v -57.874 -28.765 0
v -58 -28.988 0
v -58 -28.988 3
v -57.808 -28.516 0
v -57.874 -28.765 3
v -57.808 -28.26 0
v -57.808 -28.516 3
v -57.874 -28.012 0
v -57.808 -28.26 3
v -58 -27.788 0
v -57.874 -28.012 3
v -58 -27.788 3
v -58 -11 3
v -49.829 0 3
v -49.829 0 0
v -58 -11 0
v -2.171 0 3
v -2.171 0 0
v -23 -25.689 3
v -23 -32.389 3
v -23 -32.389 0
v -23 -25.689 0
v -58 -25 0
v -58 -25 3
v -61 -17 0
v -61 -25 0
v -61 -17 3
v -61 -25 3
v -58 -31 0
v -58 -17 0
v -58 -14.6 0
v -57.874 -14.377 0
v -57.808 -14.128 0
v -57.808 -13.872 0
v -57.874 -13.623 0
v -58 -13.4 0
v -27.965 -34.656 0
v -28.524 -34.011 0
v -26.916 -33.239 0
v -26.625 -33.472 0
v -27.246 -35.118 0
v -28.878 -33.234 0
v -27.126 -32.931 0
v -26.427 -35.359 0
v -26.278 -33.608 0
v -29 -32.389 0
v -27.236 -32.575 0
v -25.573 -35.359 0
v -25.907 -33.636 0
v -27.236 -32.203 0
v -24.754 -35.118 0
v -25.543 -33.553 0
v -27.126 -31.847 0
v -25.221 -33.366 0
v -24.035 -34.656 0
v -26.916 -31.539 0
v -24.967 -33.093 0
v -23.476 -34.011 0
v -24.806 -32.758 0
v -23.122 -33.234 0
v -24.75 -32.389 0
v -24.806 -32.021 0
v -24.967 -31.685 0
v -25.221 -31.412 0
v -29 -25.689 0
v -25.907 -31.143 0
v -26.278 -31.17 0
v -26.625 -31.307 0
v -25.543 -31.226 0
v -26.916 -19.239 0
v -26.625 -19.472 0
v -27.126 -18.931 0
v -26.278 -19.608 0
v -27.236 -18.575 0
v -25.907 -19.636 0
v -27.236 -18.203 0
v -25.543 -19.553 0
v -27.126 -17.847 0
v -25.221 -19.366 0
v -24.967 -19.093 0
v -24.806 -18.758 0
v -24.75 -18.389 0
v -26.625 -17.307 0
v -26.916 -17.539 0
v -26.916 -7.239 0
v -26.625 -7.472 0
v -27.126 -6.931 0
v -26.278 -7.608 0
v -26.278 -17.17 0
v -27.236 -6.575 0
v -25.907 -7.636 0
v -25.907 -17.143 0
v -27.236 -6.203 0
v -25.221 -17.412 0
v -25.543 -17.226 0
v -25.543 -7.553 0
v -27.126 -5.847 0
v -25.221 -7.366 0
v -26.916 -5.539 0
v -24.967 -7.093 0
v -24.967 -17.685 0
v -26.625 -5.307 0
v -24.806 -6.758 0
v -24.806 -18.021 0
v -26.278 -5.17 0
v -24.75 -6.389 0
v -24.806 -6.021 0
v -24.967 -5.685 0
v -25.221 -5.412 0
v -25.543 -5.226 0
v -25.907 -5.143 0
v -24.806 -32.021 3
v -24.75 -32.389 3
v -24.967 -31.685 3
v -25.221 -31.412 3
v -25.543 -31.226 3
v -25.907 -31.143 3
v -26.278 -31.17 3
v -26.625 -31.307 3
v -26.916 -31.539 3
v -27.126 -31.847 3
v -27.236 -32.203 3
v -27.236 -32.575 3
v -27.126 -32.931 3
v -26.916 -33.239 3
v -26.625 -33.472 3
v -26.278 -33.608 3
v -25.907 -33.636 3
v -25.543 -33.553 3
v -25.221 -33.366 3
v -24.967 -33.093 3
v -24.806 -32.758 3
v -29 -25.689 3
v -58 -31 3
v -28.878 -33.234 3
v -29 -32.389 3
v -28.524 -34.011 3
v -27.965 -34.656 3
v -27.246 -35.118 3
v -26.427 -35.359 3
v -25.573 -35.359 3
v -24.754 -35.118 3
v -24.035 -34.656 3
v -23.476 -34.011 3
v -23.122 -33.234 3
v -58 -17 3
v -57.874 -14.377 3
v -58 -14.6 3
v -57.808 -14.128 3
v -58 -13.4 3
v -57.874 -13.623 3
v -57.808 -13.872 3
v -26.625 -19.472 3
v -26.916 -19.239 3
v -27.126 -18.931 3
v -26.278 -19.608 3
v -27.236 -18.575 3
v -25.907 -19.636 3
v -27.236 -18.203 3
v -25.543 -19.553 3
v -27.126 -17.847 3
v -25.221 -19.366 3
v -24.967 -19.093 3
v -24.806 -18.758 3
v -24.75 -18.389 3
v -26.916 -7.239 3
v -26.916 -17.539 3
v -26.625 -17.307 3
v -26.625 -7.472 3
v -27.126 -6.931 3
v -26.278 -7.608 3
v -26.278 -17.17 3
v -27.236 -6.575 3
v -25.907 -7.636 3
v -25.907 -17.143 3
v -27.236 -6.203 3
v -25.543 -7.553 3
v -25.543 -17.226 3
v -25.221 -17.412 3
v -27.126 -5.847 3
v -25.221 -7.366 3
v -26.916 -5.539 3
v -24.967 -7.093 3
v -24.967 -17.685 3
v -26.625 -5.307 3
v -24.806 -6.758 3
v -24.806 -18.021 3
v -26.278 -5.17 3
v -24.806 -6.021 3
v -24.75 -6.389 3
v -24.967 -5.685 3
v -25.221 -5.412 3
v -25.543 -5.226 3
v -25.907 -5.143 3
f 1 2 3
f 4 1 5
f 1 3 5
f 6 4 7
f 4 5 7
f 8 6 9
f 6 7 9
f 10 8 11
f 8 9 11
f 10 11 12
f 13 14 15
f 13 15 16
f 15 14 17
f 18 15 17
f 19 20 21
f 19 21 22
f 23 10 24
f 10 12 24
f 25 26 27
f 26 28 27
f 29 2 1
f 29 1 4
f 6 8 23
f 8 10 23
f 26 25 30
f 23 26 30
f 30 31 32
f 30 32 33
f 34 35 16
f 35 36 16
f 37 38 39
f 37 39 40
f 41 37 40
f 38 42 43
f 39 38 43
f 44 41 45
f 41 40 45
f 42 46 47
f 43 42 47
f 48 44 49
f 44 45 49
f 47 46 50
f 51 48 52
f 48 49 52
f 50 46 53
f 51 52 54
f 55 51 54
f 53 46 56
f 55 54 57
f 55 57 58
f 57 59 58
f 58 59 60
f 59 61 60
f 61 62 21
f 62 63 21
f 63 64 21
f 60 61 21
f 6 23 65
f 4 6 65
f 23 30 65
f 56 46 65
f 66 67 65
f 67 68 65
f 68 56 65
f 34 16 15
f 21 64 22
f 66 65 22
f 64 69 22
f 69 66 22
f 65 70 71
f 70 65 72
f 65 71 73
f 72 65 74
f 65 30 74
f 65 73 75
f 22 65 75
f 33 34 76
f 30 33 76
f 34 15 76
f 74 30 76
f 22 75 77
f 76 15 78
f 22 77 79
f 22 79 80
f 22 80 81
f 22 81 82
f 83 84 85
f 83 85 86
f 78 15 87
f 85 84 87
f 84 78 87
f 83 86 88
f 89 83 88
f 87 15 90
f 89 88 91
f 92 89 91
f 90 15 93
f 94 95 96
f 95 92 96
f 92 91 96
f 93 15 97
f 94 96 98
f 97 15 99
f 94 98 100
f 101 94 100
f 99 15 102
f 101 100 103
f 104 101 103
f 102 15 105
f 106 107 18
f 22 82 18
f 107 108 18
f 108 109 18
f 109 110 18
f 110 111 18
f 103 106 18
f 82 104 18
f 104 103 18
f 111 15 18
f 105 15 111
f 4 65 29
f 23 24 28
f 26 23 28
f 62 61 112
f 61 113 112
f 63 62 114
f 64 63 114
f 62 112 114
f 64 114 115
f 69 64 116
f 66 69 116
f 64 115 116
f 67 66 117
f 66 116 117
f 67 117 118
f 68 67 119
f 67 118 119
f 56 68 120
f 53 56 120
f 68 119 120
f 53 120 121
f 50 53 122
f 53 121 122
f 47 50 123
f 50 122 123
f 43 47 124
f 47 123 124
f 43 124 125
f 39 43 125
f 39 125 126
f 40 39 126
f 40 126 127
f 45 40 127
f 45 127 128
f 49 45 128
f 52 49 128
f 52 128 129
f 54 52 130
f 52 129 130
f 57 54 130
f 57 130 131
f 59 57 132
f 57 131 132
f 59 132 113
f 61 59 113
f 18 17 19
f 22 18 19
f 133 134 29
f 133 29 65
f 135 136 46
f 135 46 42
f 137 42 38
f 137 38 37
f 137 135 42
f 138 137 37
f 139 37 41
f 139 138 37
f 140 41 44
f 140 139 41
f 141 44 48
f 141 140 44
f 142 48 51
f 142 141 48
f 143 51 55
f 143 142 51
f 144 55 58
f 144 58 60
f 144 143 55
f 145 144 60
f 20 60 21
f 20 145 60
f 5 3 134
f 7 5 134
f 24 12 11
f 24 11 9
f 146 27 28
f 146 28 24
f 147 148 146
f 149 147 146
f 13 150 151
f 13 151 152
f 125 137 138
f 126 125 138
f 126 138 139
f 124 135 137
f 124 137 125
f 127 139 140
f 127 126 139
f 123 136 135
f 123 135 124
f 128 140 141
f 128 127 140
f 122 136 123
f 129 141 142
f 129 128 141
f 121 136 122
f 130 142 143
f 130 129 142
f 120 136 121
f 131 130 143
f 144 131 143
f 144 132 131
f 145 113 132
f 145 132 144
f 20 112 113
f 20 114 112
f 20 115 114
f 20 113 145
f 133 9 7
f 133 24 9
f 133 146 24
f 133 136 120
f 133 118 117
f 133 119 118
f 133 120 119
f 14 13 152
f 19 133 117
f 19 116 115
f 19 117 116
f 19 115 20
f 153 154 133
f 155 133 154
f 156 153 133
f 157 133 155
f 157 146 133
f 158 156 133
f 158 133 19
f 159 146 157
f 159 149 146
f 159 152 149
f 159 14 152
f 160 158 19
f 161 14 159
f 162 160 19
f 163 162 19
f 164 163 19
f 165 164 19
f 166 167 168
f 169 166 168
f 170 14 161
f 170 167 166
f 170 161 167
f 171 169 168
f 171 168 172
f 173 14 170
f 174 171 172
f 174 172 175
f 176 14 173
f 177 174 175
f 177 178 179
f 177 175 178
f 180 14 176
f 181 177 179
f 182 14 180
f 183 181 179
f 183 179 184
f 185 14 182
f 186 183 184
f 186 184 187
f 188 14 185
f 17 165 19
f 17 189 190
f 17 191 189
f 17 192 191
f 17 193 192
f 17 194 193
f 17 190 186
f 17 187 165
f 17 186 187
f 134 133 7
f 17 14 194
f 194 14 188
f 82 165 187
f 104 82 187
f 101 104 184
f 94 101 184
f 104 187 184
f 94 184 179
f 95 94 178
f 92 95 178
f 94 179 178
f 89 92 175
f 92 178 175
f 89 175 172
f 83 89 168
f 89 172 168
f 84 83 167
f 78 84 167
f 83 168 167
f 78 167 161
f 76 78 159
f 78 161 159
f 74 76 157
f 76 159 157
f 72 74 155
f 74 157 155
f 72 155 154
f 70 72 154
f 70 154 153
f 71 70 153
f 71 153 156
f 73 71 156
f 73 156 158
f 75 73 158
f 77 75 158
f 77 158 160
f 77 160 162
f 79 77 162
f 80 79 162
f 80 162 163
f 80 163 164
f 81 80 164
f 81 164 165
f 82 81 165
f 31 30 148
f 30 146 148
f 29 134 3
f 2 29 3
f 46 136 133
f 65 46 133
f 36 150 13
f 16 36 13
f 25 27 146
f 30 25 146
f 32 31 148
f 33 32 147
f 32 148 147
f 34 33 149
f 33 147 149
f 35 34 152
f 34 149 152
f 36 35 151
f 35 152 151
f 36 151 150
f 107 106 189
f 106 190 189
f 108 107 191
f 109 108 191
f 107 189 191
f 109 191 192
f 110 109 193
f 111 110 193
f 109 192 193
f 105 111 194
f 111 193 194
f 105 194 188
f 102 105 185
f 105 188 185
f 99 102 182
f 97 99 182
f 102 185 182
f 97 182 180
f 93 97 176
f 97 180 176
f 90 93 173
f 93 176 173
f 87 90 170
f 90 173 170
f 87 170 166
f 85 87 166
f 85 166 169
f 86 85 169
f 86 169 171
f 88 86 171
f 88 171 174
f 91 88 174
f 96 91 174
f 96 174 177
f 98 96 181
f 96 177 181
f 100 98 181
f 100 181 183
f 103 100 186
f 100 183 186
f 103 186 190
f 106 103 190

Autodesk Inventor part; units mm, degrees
ref_plane "YZ Plane" through (0, 0, 0) normal (1, 0, 0) x (0, 1, 0)
ref_plane "XZ Plane" through (0, 0, 0) normal (0, 1, 0) x (-1, 0, 0)
ref_plane "XY Plane" through (0, 0, 0) normal (0, 0, 1) x (1, 0, 0)
sketch "スケッチ1" plane through (0, 0, 0) normal (0, 0, 1) x (1, 0, 0)
  line L0 (0, 0) -> (-65, 0)
  line L1 (-65, 0) -> (-65, -60)
  line L2 (-65, -60) -> (0, -60)
  line L3 (0, -60) -> (0, 0)
  dimension "d0" = 65
  dimension "d1" = 60
extrude "押し出し1" add sketch "スケッチ1" along normal blind 3
sketch "スケッチ2" plane through (0, 0, 3) normal (0, 0, 1) x (1, 0, 0)
  line L0 (-29, -25.6891) -> (-49.829, 0)
  line L1 (-2.171, 0) -> (-23, -25.6891)
  line L2 (-62, -31) -> (-65, -31)
  line L3 (-65, -31) -> (-65, -25)
  line L4 (-65, -25) -> (-62, -25)
  line L5 (-62, -25) -> (-62, -31)
  line L6 (-62, -17) -> (-65, -17)
  line L7 (-65, -17) -> (-65, -11)
  line L8 (-65, -11) -> (-62, -11)
  line L9 (-62, -11) -> (-62, -17)
  line L10 (-65, 4) -> (-62, 4)
  line L11 (-62, 4) -> (-62, 0)
  line L12 (-62, 0) -> (-65, 0)
  line L13 (-65, -4) -> (-65, 0)
  line L14 (-62, -4) -> (-65, -4)
  line L15 (-62, 0) -> (-62, -4)
  line L16 (-65, 0) -> (-65, 4)
  line L17 (-65, -40) -> (-62, -40)
  line L18 (0, 0) -> (0, -60) projected
  line L19 (0, -60) -> (-65, -60) projected
  line L20 (-65, -60) -> (-65, 0) projected
  line L21 (-65, 0) -> (0, 0) projected
  line L22 (-49.829, 0) -> (-62, -11)
  arc A0 (-29, -32.3891) -> (-23, -32.3891) centre (-26, -32.3891) ccw
  line L23 (-26, -32.3891) -> (-26, -29.3891) construction
  circle A1 centre (-26, -32.3891) radius 1.25
  line L24 (-23, -32.3891) -> (-23, -25.6891)
  line L25 (-29, -32.3891) -> (-29, -25.6891)
  circle A2 centre (-26, -18.3891) radius 1.25
  circle A3 centre (-26, -6.3891) radius 1.25
  line L26 (-29, -25.6891) -> (-62, -31)
  dimension "d4" = 6
  dimension "d5" = 2.5
  dimension "d6" = 3
  dimension "d7" = 2.5
  dimension "d8" = 2.5
  dimension "d9" = 14
  dimension "d10" = 26
extrude "押し出し2" cut sketch "スケッチ2" against normal blind 3 contours L26 L5 L4 L20 L6 L9 L22 L0 | L0 L21 L1 L24 A0 L25 keep common part
sketch "スケッチ3" plane through (0, 0, 3) normal (0, 0, 1) x (1, 0, 0)
  circle A0 centre (-26, -6.3891) radius 1.25 projected
  circle A1 centre (-26, -18.3891) radius 1.25 projected
  circle A2 centre (-26, -32.3891) radius 1.25 projected
  line L0 (-62, -25) -> (-65, -25) projected
  line L1 (-65, -25) -> (-65, -17) projected
  line L2 (-65, -17) -> (-62, -17) projected
  line L3 (-62, -17) -> (-62, -11) projected
  line L4 (-62, -11) -> (-49.829, 0) projected
  line L5 (-49.829, 0) -> (-2.171, 0) projected
  line L6 (-2.171, 0) -> (-23, -25.6891) projected
  line L7 (-23, -25.6891) -> (-23, -32.3891) projected
  arc A3 (-29, -32.3891) -> (-23, -32.3891) centre (-26, -32.3891) ccw projected
  line L8 (-29, -32.3891) -> (-29, -25.6891) projected
  line L9 (-29, -25.6891) -> (-62, -31) projected
  line L10 (-62, -31) -> (-62, -25) projected
  arc A4 (-62, -28.9881) -> (-62, -27.7881) centre (-62.8, -28.3881) ccw
  arc A5 (-62, -14.6) -> (-62, -13.4) centre (-62.8, -14) ccw
  point P0 (0, 0)
  dimension "d13" = 2
  dimension "d14" = 2
  dimension "d15" = 3
  dimension "d16" = 3.3881
  dimension "d17" = 0.8
extrude "押し出し3" cut sketch "スケッチ3" against normal blind 3 contours A4 L10 | L3 A5
sketch "スケッチ4" plane through (0, 0, 3) normal (0, 0, 1) x (1, 0, 0)
  circle A0 centre (-26, -6.3891) radius 1.25 projected
  circle A1 centre (-26, -18.3891) radius 1.25 projected
  circle A2 centre (-26, -32.3891) radius 1.25 projected
  line L0 (-29, -32.3891) -> (-29, -25.6891) projected
  line L1 (-29, -25.6891) -> (-62, -31) projected
  line L2 (-62, -31) -> (-62, -28.9881) projected
  arc A3 (-62, -28.9881) -> (-62, -27.7881) centre (-62.8, -28.3881) ccw projected
  line L3 (-62, -27.7881) -> (-62, -25) projected
  line L4 (-62, -25) -> (-65, -25) projected
  line L5 (-65, -25) -> (-65, -17) projected
  line L6 (-65, -17) -> (-62, -17) projected
  line L7 (-62, -17) -> (-62, -14.6) projected
  arc A4 (-62, -14.6) -> (-62, -13.4) centre (-62.8, -14) ccw projected
  line L8 (-62, -13.4) -> (-62, -11) projected
  line L9 (-62, -11) -> (-49.829, 0) projected
  line L10 (-49.829, 0) -> (-2.171, 0) projected
  line L11 (-2.171, 0) -> (-23, -25.6891) projected
  line L12 (-23, -25.6891) -> (-23, -32.3891) projected
  arc A5 (-29, -32.3891) -> (-23, -32.3891) centre (-26, -32.3891) ccw projected
  line L13 (-58, -25) -> (-61, -25)
  line L14 (-61, -25) -> (-61, -17)
  line L15 (-61, -17) -> (-58, -17)
  line L16 (-65, -17) -> (-65, -25) projected
  line L17 (-62, -25) -> (-65, -25) projected
  circle A6 centre (-58.8, -28.3881) radius 1
  circle A7 centre (-58.8, -14) radius 1
  arc A8 (-62, -14.6) -> (-62, -13.4) centre (-62.8, -14) ccw projected
  line L18 (-49.829, 0) -> (-58, -11)
  line L19 (-58, -31) -> (-29, -25.6891)
  line L20 (-29, -25.6891) -> (-49.829, 0)
  line L21 (-58, -31) -> (-58, -28.9881)
  line L22 (-58, -27.7881) -> (-58, -25)
  line L23 (-58, -17) -> (-58, -14.6)
  line L24 (-58, -13.4) -> (-58, -11)
  dimension "d26" = 3
  dimension "d27" = 6
  dimension "d28" = 6
  dimension "d29" = 4
sketch "スケッチ5" plane through (0, 0, 3) normal (0, 0, 1) x (1, 0, 0)
  circle A0 centre (-26, -6.3891) radius 1.25 projected
  circle A1 centre (-26, -18.3891) radius 1.25 projected
  circle A2 centre (-26, -32.3891) radius 1.25 projected
  line L0 (-29, -32.3891) -> (-29, -25.6891) projected
  line L1 (-29, -25.6891) -> (-62, -31) projected
  line L2 (-62, -31) -> (-62, -28.9881) projected
  arc A3 (-62, -28.9881) -> (-62, -27.7881) centre (-62.8, -28.3881) ccw projected
  line L3 (-62, -27.7881) -> (-62, -25) projected
  line L4 (-62, -25) -> (-65, -25) projected
  line L5 (-65, -25) -> (-65, -17) projected
  line L6 (-65, -17) -> (-62, -17) projected
  line L7 (-62, -17) -> (-62, -14.6) projected
  arc A4 (-62, -14.6) -> (-62, -13.4) centre (-62.8, -14) ccw projected
  line L8 (-62, -13.4) -> (-62, -11) projected
  line L9 (-62, -11) -> (-49.829, 0) projected
  line L10 (-49.829, 0) -> (-2.171, 0) projected
  line L11 (-2.171, 0) -> (-23, -25.6891) projected
  line L12 (-23, -25.6891) -> (-23, -32.3891) projected
  arc A5 (-29, -32.3891) -> (-23, -32.3891) centre (-26, -32.3891) ccw projected
  circle A6 centre (-26, -6.3891) radius 1.25 projected
  circle A7 centre (-26, -18.3891) radius 1.25 projected
  circle A8 centre (-26, -32.3891) radius 1.25 projected
  line L13 (-29, -32.3891) -> (-29, -25.6891) projected
  line L14 (-29, -25.6891) -> (-62, -31) projected
  line L15 (-62, -31) -> (-62, -28.9881) projected
  arc A9 (-62, -28.9881) -> (-62, -27.7881) centre (-62.8, -28.3881) ccw projected
  line L16 (-62, -27.7881) -> (-62, -25) projected
  line L17 (-62, -25) -> (-65, -25) projected
  line L18 (-65, -25) -> (-65, -17) projected
  line L19 (-65, -17) -> (-62, -17) projected
  line L20 (-62, -17) -> (-62, -14.6) projected
  arc A10 (-62, -14.6) -> (-62, -13.4) centre (-62.8, -14) ccw projected
  line L21 (-62, -13.4) -> (-62, -11) projected
  line L22 (-62, -11) -> (-49.829, 0) projected
  line L23 (-49.829, 0) -> (-2.171, 0) projected
  line L24 (-2.171, 0) -> (-23, -25.6891) projected
  line L25 (-23, -25.6891) -> (-23, -32.3891) projected
  arc A11 (-29, -32.3891) -> (-23, -32.3891) centre (-26, -32.3891) ccw projected
  circle A12 centre (-26, -6.3891) radius 1.25 projected
  circle A13 centre (-26, -18.3891) radius 1.25 projected
  circle A14 centre (-26, -32.3891) radius 1.25 projected
  line L26 (-29, -32.3891) -> (-29, -25.6891) projected
  line L27 (-29, -25.6891) -> (-62, -31) projected
  line L28 (-62, -31) -> (-62, -28.9881) projected
  arc A15 (-62, -28.9881) -> (-62, -27.7881) centre (-62.8, -28.3881) ccw projected
  line L29 (-62, -27.7881) -> (-62, -25) projected
  line L30 (-62, -25) -> (-65, -25) projected
  line L31 (-65, -25) -> (-65, -17) projected
  line L32 (-65, -17) -> (-62, -17) projected
  line L33 (-62, -17) -> (-62, -14.6) projected
  arc A16 (-62, -14.6) -> (-62, -13.4) centre (-62.8, -14) ccw projected
  line L34 (-62, -13.4) -> (-62, -11) projected
  line L35 (-62, -11) -> (-49.829, 0) projected
  line L36 (-49.829, 0) -> (-2.171, 0) projected
  line L37 (-2.171, 0) -> (-23, -25.6891) projected
  line L38 (-23, -25.6891) -> (-23, -32.3891) projected
  arc A17 (-29, -32.3891) -> (-23, -32.3891) centre (-26, -32.3891) ccw projected
  arc A18 (-62, -14.6) -> (-62, -13.4) centre (-62.8, -14) ccw projected
  line L39 (-62, -17) -> (-62, -14.6) projected
  line L40 (-65, -17) -> (-62, -17) projected
  line L41 (-65, -17) -> (-65, -25) projected
  line L42 (-62, -25) -> (-65, -25) projected
  line L43 (-62, -27.7881) -> (-62, -25) projected
  arc A19 (-62, -28.9881) -> (-62, -27.7881) centre (-62.8, -28.3881) ccw projected
  line L44 (-62, -31) -> (-62, -28.9881) projected
  line L45 (-29, -25.6891) -> (-62, -31) projected
  line L46 (-29, -32.3891) -> (-29, -25.6891) projected
  arc A20 (-29, -32.3891) -> (-23, -32.3891) centre (-26, -32.3891) ccw projected
  line L47 (-23, -25.6891) -> (-23, -32.3891) projected
  line L48 (-2.171, 0) -> (-23, -25.6891) projected
  line L49 (-2.171, 0) -> (-49.829, 0) projected
  line L50 (-62, -11) -> (-49.829, 0) projected
  line L51 (-62, -13.4) -> (-62, -11) projected
  circle A21 centre (-26, -32.3891) radius 1.25 projected
  circle A22 centre (-26, -18.3891) radius 1.25 projected
  circle A23 centre (-26, -6.3891) radius 1.25 projected
  line L52 (-29, -25.6891) -> (-49.829, 0)
  line L53 (-29, -25.6891) -> (-65.9346, -36.6422)
  line L54 (-65.9346, -36.6422) -> (-73.9425, -10.887)
  line L55 (-73.9425, -10.887) -> (-49.829, 0)
  point P0 (0, 0)
extrude "押し出し4" cut sketch "スケッチ5" against normal blind 3 contours L1 L2 A3 L3 L4 L5 L6 L7 A4 L8 L9 L52
extrude "押し出し5" add sketch "スケッチ4" against normal blind 3 contours L19 L21 L1 | L1 L21 A6 L22 L13 L14 L15 L23 A7 L24 L18 L20
equation "\"d28\" = d27"
properties part number "handPlate2"
